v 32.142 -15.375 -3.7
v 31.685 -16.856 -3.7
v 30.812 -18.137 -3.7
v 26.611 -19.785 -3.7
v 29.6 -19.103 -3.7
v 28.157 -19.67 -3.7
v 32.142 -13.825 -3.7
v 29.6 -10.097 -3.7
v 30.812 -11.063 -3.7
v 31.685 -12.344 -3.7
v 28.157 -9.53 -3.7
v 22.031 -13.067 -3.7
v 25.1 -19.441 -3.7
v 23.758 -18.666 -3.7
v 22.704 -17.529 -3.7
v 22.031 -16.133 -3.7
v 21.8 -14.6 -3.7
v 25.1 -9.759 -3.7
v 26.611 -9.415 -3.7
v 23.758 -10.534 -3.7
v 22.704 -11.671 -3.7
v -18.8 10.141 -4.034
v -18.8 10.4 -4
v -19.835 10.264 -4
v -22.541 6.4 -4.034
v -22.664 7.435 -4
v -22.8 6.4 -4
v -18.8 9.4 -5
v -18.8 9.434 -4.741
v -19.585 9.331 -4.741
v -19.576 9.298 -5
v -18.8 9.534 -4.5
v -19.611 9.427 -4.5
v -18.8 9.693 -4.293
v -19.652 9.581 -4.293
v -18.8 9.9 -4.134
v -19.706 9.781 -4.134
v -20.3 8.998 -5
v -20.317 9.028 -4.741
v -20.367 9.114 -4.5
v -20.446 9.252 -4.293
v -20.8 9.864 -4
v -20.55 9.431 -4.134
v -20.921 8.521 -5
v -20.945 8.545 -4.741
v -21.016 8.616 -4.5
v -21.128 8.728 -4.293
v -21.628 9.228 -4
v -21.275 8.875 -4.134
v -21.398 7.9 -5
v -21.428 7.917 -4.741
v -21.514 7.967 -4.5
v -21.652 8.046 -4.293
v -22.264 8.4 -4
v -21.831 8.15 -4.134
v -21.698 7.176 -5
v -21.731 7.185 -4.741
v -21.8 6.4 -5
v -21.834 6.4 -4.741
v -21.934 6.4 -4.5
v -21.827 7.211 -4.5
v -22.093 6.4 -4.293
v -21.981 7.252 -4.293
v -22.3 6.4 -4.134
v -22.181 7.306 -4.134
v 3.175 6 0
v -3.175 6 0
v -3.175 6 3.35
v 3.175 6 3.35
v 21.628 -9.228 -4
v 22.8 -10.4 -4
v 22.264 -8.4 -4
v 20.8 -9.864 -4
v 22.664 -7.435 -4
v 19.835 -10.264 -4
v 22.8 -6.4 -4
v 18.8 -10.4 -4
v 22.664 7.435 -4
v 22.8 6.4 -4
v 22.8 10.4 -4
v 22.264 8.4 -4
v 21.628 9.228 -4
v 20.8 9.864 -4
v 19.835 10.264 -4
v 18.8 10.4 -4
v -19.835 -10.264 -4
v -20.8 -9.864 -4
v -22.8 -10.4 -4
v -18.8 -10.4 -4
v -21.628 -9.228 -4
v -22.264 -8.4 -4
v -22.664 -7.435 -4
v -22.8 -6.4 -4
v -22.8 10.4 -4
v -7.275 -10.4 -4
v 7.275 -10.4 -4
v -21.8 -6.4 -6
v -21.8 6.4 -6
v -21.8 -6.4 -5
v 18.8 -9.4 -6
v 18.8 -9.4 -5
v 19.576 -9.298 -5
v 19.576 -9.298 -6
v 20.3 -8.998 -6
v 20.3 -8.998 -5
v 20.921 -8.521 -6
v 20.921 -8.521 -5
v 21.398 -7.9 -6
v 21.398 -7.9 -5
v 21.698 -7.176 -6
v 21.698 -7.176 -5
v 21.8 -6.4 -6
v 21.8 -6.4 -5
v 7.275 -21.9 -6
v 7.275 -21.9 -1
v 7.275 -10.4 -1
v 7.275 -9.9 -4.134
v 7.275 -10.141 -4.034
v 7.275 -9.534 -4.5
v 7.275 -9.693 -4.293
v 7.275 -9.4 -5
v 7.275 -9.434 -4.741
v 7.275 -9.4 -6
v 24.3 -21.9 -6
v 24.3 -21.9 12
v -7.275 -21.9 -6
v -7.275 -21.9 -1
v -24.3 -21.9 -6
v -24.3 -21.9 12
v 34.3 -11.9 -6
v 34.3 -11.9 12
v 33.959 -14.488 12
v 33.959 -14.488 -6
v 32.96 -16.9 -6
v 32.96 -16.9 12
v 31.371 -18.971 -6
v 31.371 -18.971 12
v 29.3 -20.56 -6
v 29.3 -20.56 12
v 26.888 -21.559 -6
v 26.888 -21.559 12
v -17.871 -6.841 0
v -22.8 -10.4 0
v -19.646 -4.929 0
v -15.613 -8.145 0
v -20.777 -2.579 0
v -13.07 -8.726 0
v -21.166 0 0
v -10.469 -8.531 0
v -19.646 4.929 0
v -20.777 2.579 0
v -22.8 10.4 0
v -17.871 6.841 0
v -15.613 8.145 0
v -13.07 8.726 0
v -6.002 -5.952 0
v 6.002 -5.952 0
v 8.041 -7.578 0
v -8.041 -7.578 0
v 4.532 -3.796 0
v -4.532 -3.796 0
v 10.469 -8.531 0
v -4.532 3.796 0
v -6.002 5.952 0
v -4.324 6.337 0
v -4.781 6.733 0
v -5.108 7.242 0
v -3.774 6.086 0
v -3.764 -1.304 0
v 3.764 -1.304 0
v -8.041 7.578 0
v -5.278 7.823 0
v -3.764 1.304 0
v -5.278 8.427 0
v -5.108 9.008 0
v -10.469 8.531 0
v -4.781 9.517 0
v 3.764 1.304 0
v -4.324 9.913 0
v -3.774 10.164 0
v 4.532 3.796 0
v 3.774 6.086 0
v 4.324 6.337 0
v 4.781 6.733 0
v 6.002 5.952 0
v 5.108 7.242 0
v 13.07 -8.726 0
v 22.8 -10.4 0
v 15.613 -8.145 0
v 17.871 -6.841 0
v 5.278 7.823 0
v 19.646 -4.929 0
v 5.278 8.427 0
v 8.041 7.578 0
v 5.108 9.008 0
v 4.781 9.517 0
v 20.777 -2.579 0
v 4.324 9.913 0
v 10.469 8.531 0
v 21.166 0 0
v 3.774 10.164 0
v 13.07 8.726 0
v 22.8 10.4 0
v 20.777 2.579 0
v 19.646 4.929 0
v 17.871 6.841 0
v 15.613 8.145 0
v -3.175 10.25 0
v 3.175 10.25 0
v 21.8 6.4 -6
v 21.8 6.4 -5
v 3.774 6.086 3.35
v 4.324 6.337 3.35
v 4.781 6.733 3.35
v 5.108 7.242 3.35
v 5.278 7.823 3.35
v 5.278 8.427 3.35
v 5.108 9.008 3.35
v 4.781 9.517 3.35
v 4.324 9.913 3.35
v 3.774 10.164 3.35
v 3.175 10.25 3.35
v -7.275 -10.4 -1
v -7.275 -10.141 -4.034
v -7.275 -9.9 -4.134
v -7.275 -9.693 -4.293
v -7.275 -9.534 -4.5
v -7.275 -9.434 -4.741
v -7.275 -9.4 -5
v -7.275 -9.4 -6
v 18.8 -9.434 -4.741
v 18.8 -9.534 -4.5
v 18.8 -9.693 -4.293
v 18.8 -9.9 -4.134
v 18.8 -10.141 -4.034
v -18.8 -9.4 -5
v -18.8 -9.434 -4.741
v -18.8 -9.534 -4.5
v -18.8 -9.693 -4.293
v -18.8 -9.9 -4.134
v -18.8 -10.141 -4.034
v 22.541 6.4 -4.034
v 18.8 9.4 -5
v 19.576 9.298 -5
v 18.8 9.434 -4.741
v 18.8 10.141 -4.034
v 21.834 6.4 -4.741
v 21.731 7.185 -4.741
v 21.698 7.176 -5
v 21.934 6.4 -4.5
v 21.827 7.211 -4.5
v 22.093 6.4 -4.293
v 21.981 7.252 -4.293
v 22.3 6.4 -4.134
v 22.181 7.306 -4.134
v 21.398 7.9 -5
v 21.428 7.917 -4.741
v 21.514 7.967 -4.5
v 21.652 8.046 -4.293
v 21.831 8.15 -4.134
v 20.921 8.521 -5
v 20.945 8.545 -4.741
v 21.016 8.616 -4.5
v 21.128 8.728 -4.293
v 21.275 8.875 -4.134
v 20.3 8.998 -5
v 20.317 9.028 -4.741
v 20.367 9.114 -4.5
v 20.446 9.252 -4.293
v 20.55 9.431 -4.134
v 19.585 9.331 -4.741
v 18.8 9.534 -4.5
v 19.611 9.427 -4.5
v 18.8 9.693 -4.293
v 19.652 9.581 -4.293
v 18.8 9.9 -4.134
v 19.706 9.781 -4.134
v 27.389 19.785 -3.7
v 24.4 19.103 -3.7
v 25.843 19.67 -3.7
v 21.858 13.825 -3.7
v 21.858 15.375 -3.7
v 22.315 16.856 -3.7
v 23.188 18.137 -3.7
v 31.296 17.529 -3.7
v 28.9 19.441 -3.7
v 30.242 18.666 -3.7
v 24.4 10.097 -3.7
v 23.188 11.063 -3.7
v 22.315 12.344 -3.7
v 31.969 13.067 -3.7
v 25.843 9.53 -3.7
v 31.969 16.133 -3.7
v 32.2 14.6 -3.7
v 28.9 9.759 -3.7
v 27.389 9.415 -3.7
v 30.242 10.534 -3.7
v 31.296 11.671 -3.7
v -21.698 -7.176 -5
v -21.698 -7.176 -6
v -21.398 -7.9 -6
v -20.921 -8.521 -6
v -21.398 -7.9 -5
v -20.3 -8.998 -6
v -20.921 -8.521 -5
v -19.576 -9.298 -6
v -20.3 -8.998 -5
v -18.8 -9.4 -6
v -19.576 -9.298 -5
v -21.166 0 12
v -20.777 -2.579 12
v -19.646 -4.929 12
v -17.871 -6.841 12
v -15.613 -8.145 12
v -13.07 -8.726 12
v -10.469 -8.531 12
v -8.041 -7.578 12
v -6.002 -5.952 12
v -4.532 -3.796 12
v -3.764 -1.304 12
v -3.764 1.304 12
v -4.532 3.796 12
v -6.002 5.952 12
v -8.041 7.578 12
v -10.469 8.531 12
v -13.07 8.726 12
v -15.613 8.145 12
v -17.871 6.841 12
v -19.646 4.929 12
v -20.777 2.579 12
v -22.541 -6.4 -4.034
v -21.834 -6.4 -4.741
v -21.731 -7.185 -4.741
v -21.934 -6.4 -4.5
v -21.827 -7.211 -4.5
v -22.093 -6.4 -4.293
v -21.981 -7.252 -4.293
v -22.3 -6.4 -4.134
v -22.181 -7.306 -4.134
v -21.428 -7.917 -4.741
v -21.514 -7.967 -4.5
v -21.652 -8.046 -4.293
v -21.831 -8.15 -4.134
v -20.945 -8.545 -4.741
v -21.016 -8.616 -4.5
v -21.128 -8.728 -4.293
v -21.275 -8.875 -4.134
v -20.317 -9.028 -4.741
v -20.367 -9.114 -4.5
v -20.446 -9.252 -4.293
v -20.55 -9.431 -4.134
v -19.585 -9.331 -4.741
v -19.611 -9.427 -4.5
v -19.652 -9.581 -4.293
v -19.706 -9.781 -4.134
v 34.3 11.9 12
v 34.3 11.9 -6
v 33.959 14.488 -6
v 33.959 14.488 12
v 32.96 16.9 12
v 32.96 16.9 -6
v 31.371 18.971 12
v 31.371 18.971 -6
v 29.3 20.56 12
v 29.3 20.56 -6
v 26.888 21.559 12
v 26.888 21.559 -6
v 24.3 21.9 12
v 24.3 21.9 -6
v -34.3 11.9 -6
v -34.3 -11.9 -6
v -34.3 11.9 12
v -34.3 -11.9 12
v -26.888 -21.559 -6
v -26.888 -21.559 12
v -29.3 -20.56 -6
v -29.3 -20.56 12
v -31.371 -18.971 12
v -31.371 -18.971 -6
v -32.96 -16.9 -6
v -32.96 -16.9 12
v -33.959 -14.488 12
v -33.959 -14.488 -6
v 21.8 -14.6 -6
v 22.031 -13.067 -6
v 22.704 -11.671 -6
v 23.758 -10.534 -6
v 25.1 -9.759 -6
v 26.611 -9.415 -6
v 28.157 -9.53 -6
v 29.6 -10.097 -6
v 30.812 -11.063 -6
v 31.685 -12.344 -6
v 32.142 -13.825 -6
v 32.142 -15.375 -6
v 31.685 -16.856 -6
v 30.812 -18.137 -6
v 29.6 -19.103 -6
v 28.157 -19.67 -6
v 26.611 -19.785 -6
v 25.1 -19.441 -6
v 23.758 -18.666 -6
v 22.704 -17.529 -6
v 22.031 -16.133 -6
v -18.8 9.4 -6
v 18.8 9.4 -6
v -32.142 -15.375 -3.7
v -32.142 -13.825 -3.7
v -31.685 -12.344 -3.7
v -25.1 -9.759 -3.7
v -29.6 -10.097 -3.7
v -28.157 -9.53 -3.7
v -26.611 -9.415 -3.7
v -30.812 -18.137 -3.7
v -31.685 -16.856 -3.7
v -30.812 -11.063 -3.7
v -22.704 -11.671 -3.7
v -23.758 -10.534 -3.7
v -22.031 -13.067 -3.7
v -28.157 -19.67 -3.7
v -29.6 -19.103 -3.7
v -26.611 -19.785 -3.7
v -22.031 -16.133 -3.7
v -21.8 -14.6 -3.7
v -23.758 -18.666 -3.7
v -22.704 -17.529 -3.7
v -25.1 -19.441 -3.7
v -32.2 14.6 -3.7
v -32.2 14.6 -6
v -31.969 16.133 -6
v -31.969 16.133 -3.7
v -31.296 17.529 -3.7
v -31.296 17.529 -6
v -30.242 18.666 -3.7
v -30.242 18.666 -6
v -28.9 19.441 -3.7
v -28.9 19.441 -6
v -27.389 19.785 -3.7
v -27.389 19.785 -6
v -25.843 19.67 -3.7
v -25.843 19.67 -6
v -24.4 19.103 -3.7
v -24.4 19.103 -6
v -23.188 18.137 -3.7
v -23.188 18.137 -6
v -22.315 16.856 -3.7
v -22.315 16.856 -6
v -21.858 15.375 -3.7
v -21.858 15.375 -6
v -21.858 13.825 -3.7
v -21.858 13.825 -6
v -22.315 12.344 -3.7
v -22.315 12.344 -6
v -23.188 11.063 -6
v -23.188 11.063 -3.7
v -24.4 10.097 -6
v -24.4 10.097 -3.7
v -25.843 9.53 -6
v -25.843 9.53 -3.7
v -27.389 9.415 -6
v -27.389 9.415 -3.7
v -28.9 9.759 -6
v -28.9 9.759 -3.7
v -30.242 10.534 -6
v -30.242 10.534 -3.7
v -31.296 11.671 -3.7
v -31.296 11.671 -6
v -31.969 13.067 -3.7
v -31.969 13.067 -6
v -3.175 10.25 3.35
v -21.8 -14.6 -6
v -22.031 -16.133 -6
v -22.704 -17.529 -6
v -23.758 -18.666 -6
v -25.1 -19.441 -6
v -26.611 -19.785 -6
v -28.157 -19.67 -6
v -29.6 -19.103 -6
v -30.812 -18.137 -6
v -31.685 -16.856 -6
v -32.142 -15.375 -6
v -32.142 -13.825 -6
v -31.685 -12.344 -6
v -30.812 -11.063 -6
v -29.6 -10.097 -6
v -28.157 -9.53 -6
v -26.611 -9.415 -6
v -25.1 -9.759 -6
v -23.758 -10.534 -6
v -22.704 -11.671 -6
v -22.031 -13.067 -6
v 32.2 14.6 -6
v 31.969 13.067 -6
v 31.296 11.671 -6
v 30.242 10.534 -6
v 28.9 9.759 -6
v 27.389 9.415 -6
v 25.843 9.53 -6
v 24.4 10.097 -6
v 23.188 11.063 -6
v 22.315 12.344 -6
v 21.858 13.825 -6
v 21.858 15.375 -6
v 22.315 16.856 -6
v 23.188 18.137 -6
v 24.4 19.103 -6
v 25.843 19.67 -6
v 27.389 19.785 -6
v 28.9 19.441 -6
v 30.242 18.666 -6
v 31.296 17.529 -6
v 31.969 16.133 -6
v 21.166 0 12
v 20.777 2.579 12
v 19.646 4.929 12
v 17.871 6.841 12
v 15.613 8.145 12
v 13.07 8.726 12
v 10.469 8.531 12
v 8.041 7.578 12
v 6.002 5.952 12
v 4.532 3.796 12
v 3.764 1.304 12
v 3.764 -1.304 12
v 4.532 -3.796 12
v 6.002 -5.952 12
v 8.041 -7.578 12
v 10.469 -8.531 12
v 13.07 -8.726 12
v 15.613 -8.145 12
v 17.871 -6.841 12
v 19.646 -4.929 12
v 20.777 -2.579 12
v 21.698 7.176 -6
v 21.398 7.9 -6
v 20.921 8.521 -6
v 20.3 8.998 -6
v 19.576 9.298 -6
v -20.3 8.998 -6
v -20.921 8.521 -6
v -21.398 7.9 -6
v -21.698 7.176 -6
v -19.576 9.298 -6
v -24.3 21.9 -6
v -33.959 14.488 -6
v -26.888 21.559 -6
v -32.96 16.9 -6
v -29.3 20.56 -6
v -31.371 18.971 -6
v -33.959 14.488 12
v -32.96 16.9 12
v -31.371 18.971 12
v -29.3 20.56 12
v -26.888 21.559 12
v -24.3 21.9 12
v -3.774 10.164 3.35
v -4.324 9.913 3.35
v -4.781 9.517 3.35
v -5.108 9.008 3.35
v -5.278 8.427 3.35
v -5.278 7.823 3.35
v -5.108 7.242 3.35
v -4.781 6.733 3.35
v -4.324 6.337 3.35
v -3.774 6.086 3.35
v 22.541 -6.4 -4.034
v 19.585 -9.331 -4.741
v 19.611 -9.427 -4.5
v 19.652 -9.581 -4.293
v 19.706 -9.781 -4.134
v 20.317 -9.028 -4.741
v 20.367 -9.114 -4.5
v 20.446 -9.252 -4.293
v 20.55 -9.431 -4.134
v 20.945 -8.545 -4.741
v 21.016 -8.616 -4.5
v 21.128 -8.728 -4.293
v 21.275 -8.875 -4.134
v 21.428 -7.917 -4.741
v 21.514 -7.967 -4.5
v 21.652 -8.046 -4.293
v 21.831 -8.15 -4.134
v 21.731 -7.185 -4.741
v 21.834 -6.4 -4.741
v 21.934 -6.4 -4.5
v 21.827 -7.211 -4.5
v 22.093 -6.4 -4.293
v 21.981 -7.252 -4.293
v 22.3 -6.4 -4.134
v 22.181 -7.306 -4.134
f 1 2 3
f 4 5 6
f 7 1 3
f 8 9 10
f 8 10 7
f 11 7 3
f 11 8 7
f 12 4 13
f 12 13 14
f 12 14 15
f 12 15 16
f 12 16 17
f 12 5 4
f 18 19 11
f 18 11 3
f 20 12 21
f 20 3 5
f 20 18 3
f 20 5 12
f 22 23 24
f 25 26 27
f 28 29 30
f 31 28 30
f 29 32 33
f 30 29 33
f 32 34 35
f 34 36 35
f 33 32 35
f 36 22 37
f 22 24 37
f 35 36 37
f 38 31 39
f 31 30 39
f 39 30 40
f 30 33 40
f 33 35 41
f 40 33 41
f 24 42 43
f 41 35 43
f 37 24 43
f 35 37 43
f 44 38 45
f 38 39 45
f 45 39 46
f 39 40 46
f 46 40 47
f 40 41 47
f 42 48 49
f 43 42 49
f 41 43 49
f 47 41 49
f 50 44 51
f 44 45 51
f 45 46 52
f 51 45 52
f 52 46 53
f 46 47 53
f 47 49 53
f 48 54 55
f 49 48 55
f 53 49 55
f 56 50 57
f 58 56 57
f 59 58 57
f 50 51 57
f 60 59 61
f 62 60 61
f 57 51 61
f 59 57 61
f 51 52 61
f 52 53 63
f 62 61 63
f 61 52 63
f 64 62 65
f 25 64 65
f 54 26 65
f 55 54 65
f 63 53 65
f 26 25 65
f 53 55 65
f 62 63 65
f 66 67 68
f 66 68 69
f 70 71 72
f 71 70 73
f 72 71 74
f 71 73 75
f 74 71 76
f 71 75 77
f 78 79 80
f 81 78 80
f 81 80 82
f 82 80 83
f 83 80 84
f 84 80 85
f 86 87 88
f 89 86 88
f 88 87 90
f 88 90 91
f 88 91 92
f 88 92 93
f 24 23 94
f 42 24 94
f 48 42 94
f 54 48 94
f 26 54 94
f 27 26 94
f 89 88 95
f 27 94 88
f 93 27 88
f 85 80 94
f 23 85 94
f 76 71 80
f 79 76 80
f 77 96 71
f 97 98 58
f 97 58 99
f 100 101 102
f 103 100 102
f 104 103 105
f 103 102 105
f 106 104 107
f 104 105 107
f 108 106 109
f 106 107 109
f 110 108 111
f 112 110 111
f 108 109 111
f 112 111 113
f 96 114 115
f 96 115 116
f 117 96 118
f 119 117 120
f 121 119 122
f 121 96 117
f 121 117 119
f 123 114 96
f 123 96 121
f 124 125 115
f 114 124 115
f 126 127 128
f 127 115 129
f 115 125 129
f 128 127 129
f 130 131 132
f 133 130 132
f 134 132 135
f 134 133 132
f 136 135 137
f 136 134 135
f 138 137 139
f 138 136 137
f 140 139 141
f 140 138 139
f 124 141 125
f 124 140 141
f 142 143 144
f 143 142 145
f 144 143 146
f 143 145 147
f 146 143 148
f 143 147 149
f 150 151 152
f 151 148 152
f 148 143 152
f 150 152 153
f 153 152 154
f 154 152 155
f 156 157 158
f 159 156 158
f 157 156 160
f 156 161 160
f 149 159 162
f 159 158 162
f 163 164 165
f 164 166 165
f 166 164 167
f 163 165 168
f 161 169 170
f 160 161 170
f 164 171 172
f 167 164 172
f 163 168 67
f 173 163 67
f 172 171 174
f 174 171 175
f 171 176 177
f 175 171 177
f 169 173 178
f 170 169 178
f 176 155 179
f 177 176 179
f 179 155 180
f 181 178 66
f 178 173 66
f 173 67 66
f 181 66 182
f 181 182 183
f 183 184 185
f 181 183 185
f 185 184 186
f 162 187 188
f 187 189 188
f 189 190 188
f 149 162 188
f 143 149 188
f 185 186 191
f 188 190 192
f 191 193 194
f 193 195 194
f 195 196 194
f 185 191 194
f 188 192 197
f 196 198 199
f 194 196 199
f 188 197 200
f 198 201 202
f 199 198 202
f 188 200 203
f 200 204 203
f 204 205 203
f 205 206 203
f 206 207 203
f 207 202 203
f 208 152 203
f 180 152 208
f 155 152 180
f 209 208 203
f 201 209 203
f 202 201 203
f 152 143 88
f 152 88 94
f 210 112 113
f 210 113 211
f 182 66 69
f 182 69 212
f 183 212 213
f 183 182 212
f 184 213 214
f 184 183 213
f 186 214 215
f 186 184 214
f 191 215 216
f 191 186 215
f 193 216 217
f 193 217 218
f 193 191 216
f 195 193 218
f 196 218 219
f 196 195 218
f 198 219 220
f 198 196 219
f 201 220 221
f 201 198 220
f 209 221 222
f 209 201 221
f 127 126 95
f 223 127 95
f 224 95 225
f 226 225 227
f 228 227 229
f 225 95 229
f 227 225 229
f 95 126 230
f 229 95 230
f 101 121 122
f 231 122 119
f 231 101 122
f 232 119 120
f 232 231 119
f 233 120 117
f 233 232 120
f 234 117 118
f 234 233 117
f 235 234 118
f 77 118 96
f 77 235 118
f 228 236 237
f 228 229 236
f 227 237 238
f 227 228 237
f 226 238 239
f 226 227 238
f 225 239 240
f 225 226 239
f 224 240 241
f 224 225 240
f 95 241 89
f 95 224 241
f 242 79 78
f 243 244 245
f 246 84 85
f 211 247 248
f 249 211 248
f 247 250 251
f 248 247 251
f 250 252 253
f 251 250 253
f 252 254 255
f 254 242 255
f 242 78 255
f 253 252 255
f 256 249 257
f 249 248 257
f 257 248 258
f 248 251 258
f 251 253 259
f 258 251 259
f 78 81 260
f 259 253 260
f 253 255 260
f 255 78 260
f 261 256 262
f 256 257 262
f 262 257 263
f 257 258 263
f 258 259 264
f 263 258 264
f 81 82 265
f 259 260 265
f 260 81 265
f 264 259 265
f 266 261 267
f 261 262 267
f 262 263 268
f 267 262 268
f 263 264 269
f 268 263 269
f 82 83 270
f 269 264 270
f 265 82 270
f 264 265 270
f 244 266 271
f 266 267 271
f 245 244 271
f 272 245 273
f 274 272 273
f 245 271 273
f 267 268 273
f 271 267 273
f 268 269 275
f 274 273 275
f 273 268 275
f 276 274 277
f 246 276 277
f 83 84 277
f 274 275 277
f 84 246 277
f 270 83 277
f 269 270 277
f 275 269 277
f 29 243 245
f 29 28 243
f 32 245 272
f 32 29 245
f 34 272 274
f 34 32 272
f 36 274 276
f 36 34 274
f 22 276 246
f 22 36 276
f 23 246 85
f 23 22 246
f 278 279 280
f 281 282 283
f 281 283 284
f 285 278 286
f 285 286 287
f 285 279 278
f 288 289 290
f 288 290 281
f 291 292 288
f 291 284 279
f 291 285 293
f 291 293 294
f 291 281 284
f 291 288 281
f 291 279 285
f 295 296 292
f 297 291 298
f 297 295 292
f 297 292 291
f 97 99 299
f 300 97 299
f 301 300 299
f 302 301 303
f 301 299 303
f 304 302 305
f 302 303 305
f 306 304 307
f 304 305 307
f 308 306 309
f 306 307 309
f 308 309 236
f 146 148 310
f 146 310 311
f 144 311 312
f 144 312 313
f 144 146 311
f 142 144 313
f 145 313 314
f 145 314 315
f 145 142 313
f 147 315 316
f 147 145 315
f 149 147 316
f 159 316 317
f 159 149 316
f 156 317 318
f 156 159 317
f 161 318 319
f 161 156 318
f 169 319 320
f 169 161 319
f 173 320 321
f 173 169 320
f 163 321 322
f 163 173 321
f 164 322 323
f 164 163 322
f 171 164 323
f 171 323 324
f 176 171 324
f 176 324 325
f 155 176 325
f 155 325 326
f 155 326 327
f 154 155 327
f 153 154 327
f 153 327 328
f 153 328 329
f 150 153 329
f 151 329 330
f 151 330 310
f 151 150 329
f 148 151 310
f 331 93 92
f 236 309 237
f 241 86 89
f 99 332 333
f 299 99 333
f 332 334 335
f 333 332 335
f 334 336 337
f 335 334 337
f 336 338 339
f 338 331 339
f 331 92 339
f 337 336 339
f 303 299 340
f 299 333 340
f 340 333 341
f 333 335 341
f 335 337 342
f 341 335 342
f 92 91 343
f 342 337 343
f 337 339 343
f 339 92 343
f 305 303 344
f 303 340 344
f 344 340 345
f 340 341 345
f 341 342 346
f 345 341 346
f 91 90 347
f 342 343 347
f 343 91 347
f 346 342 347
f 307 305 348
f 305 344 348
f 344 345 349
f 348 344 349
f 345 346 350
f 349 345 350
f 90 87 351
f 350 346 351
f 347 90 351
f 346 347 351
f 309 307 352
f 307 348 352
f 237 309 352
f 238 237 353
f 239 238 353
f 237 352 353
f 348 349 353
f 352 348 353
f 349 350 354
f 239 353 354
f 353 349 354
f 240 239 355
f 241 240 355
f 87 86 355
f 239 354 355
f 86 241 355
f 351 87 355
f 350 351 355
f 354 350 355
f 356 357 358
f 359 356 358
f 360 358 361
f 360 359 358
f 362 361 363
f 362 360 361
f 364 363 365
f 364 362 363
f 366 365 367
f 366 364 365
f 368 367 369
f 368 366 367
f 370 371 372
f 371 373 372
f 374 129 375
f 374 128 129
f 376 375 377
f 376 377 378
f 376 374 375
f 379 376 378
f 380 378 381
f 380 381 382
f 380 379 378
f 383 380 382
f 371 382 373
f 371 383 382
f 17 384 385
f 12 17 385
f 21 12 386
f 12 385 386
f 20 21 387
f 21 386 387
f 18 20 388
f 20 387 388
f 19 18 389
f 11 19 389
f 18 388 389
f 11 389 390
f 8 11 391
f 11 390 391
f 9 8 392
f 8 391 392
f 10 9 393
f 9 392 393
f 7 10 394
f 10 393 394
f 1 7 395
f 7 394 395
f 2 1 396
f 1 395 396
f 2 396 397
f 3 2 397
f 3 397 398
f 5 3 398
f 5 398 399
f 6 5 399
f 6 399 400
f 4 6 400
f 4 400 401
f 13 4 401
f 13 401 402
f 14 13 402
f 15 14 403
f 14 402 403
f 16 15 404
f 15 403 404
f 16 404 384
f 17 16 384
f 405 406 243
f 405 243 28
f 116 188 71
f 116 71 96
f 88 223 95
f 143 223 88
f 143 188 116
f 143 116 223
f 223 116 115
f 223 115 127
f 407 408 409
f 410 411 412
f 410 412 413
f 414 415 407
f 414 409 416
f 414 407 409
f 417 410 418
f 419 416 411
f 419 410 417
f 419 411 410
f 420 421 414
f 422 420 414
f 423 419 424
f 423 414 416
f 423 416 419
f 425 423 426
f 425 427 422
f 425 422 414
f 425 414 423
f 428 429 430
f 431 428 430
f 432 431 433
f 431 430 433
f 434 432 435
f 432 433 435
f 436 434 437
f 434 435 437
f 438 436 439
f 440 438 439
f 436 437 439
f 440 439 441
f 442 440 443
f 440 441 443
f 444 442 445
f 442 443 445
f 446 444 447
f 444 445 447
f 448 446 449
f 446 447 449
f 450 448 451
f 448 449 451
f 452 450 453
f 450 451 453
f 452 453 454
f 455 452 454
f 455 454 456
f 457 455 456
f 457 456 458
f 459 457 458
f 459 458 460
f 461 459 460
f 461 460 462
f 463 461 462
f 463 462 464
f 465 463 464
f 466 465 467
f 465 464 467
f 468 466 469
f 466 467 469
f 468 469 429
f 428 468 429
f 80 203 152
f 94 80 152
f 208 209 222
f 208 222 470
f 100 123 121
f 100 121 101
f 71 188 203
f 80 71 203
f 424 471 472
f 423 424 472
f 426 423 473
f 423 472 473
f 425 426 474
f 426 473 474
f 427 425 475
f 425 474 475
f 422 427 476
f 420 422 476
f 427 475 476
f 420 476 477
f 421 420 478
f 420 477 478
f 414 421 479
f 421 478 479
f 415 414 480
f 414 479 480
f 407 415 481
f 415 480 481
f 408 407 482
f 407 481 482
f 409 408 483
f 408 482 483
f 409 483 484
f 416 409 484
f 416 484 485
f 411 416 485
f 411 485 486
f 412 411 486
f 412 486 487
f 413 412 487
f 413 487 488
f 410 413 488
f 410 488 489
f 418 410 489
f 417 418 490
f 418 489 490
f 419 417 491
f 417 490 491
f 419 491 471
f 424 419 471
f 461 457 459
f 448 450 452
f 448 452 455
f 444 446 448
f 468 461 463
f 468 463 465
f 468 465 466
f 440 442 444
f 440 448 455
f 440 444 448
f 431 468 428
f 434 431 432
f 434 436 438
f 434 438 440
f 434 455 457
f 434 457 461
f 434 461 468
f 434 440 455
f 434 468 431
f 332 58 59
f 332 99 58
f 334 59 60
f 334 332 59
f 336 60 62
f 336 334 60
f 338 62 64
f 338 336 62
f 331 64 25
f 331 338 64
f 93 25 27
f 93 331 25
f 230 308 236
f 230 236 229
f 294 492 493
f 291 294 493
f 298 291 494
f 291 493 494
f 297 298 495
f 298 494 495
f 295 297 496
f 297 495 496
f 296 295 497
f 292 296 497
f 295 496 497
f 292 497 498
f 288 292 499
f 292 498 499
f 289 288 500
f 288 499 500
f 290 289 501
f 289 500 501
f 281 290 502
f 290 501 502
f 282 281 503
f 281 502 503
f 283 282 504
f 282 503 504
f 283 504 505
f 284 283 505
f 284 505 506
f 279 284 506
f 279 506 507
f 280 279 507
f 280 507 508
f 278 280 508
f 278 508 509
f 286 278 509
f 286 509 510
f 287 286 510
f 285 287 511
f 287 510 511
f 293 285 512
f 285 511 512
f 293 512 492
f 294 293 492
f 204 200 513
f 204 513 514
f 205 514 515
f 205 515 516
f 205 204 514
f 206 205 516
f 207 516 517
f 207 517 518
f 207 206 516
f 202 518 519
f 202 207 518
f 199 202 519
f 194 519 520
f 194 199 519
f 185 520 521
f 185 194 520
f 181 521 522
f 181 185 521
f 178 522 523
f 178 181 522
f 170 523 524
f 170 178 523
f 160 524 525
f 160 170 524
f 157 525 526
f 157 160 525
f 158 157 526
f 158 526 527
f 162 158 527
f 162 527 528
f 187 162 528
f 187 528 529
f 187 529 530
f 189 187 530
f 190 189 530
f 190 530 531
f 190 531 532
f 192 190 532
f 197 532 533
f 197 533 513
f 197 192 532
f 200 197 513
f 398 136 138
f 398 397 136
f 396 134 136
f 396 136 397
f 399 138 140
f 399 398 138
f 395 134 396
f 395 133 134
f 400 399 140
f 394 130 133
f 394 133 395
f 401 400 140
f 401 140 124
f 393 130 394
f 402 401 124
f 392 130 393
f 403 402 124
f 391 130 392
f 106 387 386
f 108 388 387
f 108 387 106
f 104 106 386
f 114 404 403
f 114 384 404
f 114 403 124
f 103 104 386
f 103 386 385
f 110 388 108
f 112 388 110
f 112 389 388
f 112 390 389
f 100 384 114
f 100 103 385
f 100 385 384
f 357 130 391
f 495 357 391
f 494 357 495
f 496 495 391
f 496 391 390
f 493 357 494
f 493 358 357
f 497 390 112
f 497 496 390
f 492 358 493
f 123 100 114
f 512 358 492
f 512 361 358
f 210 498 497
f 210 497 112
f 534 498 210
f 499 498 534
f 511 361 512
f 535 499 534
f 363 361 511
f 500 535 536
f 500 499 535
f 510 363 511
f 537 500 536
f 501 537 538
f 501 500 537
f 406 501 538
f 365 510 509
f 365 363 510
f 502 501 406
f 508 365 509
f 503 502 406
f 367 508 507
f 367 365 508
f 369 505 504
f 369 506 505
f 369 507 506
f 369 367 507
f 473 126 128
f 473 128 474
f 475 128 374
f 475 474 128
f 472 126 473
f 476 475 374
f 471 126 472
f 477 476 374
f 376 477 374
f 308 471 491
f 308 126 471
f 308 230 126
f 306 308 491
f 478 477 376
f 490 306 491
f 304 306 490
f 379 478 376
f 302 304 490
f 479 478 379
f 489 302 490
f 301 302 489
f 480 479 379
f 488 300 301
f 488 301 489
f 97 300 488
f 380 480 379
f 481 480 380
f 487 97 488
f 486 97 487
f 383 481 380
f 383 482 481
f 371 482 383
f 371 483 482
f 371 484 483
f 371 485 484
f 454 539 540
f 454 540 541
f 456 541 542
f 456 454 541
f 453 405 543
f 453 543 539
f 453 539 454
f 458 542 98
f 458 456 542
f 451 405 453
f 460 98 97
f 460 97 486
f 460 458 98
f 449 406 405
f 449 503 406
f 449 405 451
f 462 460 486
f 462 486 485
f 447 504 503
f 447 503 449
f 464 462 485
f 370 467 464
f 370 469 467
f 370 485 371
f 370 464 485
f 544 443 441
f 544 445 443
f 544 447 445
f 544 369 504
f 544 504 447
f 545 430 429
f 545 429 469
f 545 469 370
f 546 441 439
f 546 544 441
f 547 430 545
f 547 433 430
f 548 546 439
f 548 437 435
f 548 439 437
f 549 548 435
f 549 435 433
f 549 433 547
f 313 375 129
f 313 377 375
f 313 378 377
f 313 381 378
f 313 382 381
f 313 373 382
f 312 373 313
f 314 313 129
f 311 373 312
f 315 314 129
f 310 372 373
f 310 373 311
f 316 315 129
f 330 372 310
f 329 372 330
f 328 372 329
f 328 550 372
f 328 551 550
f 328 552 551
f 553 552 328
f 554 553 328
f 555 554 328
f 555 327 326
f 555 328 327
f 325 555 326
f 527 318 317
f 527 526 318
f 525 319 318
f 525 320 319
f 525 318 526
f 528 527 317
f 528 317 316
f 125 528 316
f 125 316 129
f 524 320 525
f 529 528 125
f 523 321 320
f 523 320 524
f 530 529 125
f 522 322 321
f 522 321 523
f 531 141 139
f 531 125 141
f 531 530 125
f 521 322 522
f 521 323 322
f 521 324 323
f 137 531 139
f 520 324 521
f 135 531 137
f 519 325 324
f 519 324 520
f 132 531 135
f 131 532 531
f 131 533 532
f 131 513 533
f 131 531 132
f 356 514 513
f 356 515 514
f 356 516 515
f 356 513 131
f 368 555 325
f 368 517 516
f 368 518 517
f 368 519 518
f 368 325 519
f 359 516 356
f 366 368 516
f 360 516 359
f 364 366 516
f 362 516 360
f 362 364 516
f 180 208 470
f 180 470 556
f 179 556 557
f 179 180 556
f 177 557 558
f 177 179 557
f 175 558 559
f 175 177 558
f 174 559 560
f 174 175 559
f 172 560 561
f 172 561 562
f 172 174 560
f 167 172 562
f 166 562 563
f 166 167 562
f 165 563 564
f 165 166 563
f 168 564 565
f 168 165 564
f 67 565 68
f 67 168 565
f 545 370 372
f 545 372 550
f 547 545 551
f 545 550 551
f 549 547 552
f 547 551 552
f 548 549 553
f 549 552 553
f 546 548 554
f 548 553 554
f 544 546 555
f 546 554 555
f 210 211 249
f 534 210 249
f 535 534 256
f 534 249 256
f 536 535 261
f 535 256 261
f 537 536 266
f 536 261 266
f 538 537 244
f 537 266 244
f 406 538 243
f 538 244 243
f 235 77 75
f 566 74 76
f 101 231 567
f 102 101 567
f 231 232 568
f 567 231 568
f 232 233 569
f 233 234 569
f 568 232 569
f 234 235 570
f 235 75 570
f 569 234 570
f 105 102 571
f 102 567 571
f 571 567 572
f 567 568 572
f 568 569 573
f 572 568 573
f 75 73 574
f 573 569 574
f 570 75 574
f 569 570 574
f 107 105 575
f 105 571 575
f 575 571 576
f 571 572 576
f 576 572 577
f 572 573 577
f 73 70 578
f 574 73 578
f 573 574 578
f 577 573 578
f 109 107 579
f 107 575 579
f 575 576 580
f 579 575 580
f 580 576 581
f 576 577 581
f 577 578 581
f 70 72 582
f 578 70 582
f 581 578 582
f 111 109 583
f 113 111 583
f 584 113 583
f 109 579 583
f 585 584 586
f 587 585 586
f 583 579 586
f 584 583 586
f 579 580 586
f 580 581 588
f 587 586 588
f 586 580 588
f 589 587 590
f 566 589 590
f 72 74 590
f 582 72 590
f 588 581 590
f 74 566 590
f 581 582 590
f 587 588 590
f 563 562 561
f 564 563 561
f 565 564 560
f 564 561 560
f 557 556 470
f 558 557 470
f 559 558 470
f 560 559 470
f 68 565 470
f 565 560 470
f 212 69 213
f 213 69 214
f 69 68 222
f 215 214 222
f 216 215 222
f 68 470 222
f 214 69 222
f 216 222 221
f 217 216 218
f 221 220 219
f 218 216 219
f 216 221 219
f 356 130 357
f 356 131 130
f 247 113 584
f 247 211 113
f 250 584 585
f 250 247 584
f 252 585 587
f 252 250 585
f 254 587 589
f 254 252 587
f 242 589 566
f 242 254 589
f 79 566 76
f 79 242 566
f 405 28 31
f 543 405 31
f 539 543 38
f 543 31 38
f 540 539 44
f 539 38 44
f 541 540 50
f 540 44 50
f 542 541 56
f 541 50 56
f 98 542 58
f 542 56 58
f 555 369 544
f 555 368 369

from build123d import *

# Parameters (mm, degrees)
SKETCH1_W           = 68.6
SKETCH1_H           = 43.8
SKETCH1_R           = 8.75
BOSS_EXTRUDE1_DEPTH = 12
CUT_EXTRUDE1_DEPTH  = 3.35
SKETCH3_W           = 68.6
SKETCH3_H           = 43.8
SKETCH3_W_2         = 45.6
SKETCH3_H_2         = 20.8
BOSS_EXTRUDE2_DEPTH = 6
FILLET1_R           = 10
SKETCH4_R           = 5.2
CUT_EXTRUDE2_DEPTH  = 2.3
BOSS_EXTRUDE6_DEPTH = 2
FILLET2_R           = 3
FILLET3_R           = 1
SKETCH7_W           = 14.55
SKETCH7_H           = 11.5
CUT_EXTRUDE3_DEPTH  = 5


with BuildPart() as part:
    # Sketch1 → Boss-Extrude1 (new body)
    with BuildSketch(Plane.XY):
        Rectangle(SKETCH1_W, SKETCH1_H)
        with Locations((12.415962636, 0)):
            Circle(SKETCH1_R, mode=Mode.SUBTRACT)
        with Locations(Location((-12.415962636, 0, 0), (0, 0, 180))):
            Circle(SKETCH1_R, mode=Mode.SUBTRACT)
    extrude(amount=BOSS_EXTRUDE1_DEPTH)

    # Sketch2 → Cut-Extrude1 (cut)
    with BuildSketch(Plane(origin=(0, 0, 0), x_dir=(-1, 0, 0), z_dir=(0, 0, -1))):
        with BuildLine():
            Line((3.175, 6), (-3.175, 6))
            ThreePointArc((-3.175, 6), (-5.3, 8.125), (-3.175, 10.25))
            Line((-3.175, 10.25), (3.175, 10.25))
            ThreePointArc((3.175, 10.25), (5.3, 8.125), (3.175, 6))
        make_face()
    extrude(amount=-CUT_EXTRUDE1_DEPTH, mode=Mode.SUBTRACT)

    # Sketch3 → Boss-Extrude2 (add)
    with BuildSketch(Plane(origin=(0, 0, 0), x_dir=(-1, 0, 0), z_dir=(0, 0, -1))):
        Rectangle(SKETCH3_W, SKETCH3_H)
        Rectangle(SKETCH3_W_2, SKETCH3_H_2, mode=Mode.SUBTRACT)
    extrude(amount=BOSS_EXTRUDE2_DEPTH)

    # Fillet1
    fillet1_edges = [part.edges().sort_by_distance(p)[0] for p in [
        (34.3, -21.9, 3),
        (-34.3, -21.9, 3),
        (-34.3, 21.9, 3),
        (34.3, 21.9, 3),
    ]]
    fillet(fillet1_edges, radius=FILLET1_R)

    # Sketch4 → Cut-Extrude2 (cut)
    with BuildSketch(Plane(origin=(0, 0, -6), x_dir=(-1, 0, 0), z_dir=(0, 0, -1))):
        with Locations((27, 14.6)):
            Circle(SKETCH4_R)
        with Locations(Location((-27, 14.6, 0), (0, 0, 180))):
            Circle(SKETCH4_R)
        with Locations(Location((27, -14.6, 0), (0, 0, 180))):
            Circle(SKETCH4_R)
        with Locations((-27, -14.6)):
            Circle(SKETCH4_R)
    extrude(amount=-CUT_EXTRUDE2_DEPTH, mode=Mode.SUBTRACT)

    # Sketch6 → Boss-Extrude6 (add)
    with BuildSketch(Plane(origin=(0, 0, -6), x_dir=(-1, 0, 0), z_dir=(0, 0, -1))):
        Polygon((-22.8, -10.4), (-7.275, -10.4), (-7.275, -9.4), (-21.8, -9.4), (-21.8, 9.4), (21.8, 9.4), (21.8, -9.4), (7.275, -9.4), (7.275, -10.4), (22.8, -10.4), (22.8, 10.4), (-22.8, 10.4), align=None)
    extrude(amount=-BOSS_EXTRUDE6_DEPTH)

    # Fillet2
    fillet2_edges = [part.edges().sort_by_distance(p)[0] for p in [
        (-21.8, -9.4, -5),
        (-21.8, 9.4, -5),
        (21.8, 9.4, -5),
        (21.8, -9.4, -5),
    ]]
    fillet(fillet2_edges, radius=FILLET2_R)

    # Fillet3
    fillet3_edges = [part.edges().sort_by_distance(p)[0] for p in [
        (13.0375, -9.4, -4),
        (20.921320344, -8.521320344, -4),
        (21.8, 0, -4),
        (20.921320344, 8.521320344, -4),
        (0, 9.4, -4),
        (-20.921320344, 8.521320344, -4),
        (-13.0375, -9.4, -4),
        (-20.921320344, -8.521320344, -4),
        (-21.8, 0, -4),
    ]]
    fillet(fillet3_edges, radius=FILLET3_R - 0.0001)  # a hair under: the kernel refuses the full size

    # Sketch7 → Cut-Extrude3 (cut)
    with BuildSketch(Plane(origin=(0, 0, -6), x_dir=(-1, 0, 0), z_dir=(0, 0, -1))):
        with Locations((0, -16.15)):
            Rectangle(SKETCH7_W, SKETCH7_H)
    extrude(amount=-CUT_EXTRUDE3_DEPTH, mode=Mode.SUBTRACT)


solid = part.part
